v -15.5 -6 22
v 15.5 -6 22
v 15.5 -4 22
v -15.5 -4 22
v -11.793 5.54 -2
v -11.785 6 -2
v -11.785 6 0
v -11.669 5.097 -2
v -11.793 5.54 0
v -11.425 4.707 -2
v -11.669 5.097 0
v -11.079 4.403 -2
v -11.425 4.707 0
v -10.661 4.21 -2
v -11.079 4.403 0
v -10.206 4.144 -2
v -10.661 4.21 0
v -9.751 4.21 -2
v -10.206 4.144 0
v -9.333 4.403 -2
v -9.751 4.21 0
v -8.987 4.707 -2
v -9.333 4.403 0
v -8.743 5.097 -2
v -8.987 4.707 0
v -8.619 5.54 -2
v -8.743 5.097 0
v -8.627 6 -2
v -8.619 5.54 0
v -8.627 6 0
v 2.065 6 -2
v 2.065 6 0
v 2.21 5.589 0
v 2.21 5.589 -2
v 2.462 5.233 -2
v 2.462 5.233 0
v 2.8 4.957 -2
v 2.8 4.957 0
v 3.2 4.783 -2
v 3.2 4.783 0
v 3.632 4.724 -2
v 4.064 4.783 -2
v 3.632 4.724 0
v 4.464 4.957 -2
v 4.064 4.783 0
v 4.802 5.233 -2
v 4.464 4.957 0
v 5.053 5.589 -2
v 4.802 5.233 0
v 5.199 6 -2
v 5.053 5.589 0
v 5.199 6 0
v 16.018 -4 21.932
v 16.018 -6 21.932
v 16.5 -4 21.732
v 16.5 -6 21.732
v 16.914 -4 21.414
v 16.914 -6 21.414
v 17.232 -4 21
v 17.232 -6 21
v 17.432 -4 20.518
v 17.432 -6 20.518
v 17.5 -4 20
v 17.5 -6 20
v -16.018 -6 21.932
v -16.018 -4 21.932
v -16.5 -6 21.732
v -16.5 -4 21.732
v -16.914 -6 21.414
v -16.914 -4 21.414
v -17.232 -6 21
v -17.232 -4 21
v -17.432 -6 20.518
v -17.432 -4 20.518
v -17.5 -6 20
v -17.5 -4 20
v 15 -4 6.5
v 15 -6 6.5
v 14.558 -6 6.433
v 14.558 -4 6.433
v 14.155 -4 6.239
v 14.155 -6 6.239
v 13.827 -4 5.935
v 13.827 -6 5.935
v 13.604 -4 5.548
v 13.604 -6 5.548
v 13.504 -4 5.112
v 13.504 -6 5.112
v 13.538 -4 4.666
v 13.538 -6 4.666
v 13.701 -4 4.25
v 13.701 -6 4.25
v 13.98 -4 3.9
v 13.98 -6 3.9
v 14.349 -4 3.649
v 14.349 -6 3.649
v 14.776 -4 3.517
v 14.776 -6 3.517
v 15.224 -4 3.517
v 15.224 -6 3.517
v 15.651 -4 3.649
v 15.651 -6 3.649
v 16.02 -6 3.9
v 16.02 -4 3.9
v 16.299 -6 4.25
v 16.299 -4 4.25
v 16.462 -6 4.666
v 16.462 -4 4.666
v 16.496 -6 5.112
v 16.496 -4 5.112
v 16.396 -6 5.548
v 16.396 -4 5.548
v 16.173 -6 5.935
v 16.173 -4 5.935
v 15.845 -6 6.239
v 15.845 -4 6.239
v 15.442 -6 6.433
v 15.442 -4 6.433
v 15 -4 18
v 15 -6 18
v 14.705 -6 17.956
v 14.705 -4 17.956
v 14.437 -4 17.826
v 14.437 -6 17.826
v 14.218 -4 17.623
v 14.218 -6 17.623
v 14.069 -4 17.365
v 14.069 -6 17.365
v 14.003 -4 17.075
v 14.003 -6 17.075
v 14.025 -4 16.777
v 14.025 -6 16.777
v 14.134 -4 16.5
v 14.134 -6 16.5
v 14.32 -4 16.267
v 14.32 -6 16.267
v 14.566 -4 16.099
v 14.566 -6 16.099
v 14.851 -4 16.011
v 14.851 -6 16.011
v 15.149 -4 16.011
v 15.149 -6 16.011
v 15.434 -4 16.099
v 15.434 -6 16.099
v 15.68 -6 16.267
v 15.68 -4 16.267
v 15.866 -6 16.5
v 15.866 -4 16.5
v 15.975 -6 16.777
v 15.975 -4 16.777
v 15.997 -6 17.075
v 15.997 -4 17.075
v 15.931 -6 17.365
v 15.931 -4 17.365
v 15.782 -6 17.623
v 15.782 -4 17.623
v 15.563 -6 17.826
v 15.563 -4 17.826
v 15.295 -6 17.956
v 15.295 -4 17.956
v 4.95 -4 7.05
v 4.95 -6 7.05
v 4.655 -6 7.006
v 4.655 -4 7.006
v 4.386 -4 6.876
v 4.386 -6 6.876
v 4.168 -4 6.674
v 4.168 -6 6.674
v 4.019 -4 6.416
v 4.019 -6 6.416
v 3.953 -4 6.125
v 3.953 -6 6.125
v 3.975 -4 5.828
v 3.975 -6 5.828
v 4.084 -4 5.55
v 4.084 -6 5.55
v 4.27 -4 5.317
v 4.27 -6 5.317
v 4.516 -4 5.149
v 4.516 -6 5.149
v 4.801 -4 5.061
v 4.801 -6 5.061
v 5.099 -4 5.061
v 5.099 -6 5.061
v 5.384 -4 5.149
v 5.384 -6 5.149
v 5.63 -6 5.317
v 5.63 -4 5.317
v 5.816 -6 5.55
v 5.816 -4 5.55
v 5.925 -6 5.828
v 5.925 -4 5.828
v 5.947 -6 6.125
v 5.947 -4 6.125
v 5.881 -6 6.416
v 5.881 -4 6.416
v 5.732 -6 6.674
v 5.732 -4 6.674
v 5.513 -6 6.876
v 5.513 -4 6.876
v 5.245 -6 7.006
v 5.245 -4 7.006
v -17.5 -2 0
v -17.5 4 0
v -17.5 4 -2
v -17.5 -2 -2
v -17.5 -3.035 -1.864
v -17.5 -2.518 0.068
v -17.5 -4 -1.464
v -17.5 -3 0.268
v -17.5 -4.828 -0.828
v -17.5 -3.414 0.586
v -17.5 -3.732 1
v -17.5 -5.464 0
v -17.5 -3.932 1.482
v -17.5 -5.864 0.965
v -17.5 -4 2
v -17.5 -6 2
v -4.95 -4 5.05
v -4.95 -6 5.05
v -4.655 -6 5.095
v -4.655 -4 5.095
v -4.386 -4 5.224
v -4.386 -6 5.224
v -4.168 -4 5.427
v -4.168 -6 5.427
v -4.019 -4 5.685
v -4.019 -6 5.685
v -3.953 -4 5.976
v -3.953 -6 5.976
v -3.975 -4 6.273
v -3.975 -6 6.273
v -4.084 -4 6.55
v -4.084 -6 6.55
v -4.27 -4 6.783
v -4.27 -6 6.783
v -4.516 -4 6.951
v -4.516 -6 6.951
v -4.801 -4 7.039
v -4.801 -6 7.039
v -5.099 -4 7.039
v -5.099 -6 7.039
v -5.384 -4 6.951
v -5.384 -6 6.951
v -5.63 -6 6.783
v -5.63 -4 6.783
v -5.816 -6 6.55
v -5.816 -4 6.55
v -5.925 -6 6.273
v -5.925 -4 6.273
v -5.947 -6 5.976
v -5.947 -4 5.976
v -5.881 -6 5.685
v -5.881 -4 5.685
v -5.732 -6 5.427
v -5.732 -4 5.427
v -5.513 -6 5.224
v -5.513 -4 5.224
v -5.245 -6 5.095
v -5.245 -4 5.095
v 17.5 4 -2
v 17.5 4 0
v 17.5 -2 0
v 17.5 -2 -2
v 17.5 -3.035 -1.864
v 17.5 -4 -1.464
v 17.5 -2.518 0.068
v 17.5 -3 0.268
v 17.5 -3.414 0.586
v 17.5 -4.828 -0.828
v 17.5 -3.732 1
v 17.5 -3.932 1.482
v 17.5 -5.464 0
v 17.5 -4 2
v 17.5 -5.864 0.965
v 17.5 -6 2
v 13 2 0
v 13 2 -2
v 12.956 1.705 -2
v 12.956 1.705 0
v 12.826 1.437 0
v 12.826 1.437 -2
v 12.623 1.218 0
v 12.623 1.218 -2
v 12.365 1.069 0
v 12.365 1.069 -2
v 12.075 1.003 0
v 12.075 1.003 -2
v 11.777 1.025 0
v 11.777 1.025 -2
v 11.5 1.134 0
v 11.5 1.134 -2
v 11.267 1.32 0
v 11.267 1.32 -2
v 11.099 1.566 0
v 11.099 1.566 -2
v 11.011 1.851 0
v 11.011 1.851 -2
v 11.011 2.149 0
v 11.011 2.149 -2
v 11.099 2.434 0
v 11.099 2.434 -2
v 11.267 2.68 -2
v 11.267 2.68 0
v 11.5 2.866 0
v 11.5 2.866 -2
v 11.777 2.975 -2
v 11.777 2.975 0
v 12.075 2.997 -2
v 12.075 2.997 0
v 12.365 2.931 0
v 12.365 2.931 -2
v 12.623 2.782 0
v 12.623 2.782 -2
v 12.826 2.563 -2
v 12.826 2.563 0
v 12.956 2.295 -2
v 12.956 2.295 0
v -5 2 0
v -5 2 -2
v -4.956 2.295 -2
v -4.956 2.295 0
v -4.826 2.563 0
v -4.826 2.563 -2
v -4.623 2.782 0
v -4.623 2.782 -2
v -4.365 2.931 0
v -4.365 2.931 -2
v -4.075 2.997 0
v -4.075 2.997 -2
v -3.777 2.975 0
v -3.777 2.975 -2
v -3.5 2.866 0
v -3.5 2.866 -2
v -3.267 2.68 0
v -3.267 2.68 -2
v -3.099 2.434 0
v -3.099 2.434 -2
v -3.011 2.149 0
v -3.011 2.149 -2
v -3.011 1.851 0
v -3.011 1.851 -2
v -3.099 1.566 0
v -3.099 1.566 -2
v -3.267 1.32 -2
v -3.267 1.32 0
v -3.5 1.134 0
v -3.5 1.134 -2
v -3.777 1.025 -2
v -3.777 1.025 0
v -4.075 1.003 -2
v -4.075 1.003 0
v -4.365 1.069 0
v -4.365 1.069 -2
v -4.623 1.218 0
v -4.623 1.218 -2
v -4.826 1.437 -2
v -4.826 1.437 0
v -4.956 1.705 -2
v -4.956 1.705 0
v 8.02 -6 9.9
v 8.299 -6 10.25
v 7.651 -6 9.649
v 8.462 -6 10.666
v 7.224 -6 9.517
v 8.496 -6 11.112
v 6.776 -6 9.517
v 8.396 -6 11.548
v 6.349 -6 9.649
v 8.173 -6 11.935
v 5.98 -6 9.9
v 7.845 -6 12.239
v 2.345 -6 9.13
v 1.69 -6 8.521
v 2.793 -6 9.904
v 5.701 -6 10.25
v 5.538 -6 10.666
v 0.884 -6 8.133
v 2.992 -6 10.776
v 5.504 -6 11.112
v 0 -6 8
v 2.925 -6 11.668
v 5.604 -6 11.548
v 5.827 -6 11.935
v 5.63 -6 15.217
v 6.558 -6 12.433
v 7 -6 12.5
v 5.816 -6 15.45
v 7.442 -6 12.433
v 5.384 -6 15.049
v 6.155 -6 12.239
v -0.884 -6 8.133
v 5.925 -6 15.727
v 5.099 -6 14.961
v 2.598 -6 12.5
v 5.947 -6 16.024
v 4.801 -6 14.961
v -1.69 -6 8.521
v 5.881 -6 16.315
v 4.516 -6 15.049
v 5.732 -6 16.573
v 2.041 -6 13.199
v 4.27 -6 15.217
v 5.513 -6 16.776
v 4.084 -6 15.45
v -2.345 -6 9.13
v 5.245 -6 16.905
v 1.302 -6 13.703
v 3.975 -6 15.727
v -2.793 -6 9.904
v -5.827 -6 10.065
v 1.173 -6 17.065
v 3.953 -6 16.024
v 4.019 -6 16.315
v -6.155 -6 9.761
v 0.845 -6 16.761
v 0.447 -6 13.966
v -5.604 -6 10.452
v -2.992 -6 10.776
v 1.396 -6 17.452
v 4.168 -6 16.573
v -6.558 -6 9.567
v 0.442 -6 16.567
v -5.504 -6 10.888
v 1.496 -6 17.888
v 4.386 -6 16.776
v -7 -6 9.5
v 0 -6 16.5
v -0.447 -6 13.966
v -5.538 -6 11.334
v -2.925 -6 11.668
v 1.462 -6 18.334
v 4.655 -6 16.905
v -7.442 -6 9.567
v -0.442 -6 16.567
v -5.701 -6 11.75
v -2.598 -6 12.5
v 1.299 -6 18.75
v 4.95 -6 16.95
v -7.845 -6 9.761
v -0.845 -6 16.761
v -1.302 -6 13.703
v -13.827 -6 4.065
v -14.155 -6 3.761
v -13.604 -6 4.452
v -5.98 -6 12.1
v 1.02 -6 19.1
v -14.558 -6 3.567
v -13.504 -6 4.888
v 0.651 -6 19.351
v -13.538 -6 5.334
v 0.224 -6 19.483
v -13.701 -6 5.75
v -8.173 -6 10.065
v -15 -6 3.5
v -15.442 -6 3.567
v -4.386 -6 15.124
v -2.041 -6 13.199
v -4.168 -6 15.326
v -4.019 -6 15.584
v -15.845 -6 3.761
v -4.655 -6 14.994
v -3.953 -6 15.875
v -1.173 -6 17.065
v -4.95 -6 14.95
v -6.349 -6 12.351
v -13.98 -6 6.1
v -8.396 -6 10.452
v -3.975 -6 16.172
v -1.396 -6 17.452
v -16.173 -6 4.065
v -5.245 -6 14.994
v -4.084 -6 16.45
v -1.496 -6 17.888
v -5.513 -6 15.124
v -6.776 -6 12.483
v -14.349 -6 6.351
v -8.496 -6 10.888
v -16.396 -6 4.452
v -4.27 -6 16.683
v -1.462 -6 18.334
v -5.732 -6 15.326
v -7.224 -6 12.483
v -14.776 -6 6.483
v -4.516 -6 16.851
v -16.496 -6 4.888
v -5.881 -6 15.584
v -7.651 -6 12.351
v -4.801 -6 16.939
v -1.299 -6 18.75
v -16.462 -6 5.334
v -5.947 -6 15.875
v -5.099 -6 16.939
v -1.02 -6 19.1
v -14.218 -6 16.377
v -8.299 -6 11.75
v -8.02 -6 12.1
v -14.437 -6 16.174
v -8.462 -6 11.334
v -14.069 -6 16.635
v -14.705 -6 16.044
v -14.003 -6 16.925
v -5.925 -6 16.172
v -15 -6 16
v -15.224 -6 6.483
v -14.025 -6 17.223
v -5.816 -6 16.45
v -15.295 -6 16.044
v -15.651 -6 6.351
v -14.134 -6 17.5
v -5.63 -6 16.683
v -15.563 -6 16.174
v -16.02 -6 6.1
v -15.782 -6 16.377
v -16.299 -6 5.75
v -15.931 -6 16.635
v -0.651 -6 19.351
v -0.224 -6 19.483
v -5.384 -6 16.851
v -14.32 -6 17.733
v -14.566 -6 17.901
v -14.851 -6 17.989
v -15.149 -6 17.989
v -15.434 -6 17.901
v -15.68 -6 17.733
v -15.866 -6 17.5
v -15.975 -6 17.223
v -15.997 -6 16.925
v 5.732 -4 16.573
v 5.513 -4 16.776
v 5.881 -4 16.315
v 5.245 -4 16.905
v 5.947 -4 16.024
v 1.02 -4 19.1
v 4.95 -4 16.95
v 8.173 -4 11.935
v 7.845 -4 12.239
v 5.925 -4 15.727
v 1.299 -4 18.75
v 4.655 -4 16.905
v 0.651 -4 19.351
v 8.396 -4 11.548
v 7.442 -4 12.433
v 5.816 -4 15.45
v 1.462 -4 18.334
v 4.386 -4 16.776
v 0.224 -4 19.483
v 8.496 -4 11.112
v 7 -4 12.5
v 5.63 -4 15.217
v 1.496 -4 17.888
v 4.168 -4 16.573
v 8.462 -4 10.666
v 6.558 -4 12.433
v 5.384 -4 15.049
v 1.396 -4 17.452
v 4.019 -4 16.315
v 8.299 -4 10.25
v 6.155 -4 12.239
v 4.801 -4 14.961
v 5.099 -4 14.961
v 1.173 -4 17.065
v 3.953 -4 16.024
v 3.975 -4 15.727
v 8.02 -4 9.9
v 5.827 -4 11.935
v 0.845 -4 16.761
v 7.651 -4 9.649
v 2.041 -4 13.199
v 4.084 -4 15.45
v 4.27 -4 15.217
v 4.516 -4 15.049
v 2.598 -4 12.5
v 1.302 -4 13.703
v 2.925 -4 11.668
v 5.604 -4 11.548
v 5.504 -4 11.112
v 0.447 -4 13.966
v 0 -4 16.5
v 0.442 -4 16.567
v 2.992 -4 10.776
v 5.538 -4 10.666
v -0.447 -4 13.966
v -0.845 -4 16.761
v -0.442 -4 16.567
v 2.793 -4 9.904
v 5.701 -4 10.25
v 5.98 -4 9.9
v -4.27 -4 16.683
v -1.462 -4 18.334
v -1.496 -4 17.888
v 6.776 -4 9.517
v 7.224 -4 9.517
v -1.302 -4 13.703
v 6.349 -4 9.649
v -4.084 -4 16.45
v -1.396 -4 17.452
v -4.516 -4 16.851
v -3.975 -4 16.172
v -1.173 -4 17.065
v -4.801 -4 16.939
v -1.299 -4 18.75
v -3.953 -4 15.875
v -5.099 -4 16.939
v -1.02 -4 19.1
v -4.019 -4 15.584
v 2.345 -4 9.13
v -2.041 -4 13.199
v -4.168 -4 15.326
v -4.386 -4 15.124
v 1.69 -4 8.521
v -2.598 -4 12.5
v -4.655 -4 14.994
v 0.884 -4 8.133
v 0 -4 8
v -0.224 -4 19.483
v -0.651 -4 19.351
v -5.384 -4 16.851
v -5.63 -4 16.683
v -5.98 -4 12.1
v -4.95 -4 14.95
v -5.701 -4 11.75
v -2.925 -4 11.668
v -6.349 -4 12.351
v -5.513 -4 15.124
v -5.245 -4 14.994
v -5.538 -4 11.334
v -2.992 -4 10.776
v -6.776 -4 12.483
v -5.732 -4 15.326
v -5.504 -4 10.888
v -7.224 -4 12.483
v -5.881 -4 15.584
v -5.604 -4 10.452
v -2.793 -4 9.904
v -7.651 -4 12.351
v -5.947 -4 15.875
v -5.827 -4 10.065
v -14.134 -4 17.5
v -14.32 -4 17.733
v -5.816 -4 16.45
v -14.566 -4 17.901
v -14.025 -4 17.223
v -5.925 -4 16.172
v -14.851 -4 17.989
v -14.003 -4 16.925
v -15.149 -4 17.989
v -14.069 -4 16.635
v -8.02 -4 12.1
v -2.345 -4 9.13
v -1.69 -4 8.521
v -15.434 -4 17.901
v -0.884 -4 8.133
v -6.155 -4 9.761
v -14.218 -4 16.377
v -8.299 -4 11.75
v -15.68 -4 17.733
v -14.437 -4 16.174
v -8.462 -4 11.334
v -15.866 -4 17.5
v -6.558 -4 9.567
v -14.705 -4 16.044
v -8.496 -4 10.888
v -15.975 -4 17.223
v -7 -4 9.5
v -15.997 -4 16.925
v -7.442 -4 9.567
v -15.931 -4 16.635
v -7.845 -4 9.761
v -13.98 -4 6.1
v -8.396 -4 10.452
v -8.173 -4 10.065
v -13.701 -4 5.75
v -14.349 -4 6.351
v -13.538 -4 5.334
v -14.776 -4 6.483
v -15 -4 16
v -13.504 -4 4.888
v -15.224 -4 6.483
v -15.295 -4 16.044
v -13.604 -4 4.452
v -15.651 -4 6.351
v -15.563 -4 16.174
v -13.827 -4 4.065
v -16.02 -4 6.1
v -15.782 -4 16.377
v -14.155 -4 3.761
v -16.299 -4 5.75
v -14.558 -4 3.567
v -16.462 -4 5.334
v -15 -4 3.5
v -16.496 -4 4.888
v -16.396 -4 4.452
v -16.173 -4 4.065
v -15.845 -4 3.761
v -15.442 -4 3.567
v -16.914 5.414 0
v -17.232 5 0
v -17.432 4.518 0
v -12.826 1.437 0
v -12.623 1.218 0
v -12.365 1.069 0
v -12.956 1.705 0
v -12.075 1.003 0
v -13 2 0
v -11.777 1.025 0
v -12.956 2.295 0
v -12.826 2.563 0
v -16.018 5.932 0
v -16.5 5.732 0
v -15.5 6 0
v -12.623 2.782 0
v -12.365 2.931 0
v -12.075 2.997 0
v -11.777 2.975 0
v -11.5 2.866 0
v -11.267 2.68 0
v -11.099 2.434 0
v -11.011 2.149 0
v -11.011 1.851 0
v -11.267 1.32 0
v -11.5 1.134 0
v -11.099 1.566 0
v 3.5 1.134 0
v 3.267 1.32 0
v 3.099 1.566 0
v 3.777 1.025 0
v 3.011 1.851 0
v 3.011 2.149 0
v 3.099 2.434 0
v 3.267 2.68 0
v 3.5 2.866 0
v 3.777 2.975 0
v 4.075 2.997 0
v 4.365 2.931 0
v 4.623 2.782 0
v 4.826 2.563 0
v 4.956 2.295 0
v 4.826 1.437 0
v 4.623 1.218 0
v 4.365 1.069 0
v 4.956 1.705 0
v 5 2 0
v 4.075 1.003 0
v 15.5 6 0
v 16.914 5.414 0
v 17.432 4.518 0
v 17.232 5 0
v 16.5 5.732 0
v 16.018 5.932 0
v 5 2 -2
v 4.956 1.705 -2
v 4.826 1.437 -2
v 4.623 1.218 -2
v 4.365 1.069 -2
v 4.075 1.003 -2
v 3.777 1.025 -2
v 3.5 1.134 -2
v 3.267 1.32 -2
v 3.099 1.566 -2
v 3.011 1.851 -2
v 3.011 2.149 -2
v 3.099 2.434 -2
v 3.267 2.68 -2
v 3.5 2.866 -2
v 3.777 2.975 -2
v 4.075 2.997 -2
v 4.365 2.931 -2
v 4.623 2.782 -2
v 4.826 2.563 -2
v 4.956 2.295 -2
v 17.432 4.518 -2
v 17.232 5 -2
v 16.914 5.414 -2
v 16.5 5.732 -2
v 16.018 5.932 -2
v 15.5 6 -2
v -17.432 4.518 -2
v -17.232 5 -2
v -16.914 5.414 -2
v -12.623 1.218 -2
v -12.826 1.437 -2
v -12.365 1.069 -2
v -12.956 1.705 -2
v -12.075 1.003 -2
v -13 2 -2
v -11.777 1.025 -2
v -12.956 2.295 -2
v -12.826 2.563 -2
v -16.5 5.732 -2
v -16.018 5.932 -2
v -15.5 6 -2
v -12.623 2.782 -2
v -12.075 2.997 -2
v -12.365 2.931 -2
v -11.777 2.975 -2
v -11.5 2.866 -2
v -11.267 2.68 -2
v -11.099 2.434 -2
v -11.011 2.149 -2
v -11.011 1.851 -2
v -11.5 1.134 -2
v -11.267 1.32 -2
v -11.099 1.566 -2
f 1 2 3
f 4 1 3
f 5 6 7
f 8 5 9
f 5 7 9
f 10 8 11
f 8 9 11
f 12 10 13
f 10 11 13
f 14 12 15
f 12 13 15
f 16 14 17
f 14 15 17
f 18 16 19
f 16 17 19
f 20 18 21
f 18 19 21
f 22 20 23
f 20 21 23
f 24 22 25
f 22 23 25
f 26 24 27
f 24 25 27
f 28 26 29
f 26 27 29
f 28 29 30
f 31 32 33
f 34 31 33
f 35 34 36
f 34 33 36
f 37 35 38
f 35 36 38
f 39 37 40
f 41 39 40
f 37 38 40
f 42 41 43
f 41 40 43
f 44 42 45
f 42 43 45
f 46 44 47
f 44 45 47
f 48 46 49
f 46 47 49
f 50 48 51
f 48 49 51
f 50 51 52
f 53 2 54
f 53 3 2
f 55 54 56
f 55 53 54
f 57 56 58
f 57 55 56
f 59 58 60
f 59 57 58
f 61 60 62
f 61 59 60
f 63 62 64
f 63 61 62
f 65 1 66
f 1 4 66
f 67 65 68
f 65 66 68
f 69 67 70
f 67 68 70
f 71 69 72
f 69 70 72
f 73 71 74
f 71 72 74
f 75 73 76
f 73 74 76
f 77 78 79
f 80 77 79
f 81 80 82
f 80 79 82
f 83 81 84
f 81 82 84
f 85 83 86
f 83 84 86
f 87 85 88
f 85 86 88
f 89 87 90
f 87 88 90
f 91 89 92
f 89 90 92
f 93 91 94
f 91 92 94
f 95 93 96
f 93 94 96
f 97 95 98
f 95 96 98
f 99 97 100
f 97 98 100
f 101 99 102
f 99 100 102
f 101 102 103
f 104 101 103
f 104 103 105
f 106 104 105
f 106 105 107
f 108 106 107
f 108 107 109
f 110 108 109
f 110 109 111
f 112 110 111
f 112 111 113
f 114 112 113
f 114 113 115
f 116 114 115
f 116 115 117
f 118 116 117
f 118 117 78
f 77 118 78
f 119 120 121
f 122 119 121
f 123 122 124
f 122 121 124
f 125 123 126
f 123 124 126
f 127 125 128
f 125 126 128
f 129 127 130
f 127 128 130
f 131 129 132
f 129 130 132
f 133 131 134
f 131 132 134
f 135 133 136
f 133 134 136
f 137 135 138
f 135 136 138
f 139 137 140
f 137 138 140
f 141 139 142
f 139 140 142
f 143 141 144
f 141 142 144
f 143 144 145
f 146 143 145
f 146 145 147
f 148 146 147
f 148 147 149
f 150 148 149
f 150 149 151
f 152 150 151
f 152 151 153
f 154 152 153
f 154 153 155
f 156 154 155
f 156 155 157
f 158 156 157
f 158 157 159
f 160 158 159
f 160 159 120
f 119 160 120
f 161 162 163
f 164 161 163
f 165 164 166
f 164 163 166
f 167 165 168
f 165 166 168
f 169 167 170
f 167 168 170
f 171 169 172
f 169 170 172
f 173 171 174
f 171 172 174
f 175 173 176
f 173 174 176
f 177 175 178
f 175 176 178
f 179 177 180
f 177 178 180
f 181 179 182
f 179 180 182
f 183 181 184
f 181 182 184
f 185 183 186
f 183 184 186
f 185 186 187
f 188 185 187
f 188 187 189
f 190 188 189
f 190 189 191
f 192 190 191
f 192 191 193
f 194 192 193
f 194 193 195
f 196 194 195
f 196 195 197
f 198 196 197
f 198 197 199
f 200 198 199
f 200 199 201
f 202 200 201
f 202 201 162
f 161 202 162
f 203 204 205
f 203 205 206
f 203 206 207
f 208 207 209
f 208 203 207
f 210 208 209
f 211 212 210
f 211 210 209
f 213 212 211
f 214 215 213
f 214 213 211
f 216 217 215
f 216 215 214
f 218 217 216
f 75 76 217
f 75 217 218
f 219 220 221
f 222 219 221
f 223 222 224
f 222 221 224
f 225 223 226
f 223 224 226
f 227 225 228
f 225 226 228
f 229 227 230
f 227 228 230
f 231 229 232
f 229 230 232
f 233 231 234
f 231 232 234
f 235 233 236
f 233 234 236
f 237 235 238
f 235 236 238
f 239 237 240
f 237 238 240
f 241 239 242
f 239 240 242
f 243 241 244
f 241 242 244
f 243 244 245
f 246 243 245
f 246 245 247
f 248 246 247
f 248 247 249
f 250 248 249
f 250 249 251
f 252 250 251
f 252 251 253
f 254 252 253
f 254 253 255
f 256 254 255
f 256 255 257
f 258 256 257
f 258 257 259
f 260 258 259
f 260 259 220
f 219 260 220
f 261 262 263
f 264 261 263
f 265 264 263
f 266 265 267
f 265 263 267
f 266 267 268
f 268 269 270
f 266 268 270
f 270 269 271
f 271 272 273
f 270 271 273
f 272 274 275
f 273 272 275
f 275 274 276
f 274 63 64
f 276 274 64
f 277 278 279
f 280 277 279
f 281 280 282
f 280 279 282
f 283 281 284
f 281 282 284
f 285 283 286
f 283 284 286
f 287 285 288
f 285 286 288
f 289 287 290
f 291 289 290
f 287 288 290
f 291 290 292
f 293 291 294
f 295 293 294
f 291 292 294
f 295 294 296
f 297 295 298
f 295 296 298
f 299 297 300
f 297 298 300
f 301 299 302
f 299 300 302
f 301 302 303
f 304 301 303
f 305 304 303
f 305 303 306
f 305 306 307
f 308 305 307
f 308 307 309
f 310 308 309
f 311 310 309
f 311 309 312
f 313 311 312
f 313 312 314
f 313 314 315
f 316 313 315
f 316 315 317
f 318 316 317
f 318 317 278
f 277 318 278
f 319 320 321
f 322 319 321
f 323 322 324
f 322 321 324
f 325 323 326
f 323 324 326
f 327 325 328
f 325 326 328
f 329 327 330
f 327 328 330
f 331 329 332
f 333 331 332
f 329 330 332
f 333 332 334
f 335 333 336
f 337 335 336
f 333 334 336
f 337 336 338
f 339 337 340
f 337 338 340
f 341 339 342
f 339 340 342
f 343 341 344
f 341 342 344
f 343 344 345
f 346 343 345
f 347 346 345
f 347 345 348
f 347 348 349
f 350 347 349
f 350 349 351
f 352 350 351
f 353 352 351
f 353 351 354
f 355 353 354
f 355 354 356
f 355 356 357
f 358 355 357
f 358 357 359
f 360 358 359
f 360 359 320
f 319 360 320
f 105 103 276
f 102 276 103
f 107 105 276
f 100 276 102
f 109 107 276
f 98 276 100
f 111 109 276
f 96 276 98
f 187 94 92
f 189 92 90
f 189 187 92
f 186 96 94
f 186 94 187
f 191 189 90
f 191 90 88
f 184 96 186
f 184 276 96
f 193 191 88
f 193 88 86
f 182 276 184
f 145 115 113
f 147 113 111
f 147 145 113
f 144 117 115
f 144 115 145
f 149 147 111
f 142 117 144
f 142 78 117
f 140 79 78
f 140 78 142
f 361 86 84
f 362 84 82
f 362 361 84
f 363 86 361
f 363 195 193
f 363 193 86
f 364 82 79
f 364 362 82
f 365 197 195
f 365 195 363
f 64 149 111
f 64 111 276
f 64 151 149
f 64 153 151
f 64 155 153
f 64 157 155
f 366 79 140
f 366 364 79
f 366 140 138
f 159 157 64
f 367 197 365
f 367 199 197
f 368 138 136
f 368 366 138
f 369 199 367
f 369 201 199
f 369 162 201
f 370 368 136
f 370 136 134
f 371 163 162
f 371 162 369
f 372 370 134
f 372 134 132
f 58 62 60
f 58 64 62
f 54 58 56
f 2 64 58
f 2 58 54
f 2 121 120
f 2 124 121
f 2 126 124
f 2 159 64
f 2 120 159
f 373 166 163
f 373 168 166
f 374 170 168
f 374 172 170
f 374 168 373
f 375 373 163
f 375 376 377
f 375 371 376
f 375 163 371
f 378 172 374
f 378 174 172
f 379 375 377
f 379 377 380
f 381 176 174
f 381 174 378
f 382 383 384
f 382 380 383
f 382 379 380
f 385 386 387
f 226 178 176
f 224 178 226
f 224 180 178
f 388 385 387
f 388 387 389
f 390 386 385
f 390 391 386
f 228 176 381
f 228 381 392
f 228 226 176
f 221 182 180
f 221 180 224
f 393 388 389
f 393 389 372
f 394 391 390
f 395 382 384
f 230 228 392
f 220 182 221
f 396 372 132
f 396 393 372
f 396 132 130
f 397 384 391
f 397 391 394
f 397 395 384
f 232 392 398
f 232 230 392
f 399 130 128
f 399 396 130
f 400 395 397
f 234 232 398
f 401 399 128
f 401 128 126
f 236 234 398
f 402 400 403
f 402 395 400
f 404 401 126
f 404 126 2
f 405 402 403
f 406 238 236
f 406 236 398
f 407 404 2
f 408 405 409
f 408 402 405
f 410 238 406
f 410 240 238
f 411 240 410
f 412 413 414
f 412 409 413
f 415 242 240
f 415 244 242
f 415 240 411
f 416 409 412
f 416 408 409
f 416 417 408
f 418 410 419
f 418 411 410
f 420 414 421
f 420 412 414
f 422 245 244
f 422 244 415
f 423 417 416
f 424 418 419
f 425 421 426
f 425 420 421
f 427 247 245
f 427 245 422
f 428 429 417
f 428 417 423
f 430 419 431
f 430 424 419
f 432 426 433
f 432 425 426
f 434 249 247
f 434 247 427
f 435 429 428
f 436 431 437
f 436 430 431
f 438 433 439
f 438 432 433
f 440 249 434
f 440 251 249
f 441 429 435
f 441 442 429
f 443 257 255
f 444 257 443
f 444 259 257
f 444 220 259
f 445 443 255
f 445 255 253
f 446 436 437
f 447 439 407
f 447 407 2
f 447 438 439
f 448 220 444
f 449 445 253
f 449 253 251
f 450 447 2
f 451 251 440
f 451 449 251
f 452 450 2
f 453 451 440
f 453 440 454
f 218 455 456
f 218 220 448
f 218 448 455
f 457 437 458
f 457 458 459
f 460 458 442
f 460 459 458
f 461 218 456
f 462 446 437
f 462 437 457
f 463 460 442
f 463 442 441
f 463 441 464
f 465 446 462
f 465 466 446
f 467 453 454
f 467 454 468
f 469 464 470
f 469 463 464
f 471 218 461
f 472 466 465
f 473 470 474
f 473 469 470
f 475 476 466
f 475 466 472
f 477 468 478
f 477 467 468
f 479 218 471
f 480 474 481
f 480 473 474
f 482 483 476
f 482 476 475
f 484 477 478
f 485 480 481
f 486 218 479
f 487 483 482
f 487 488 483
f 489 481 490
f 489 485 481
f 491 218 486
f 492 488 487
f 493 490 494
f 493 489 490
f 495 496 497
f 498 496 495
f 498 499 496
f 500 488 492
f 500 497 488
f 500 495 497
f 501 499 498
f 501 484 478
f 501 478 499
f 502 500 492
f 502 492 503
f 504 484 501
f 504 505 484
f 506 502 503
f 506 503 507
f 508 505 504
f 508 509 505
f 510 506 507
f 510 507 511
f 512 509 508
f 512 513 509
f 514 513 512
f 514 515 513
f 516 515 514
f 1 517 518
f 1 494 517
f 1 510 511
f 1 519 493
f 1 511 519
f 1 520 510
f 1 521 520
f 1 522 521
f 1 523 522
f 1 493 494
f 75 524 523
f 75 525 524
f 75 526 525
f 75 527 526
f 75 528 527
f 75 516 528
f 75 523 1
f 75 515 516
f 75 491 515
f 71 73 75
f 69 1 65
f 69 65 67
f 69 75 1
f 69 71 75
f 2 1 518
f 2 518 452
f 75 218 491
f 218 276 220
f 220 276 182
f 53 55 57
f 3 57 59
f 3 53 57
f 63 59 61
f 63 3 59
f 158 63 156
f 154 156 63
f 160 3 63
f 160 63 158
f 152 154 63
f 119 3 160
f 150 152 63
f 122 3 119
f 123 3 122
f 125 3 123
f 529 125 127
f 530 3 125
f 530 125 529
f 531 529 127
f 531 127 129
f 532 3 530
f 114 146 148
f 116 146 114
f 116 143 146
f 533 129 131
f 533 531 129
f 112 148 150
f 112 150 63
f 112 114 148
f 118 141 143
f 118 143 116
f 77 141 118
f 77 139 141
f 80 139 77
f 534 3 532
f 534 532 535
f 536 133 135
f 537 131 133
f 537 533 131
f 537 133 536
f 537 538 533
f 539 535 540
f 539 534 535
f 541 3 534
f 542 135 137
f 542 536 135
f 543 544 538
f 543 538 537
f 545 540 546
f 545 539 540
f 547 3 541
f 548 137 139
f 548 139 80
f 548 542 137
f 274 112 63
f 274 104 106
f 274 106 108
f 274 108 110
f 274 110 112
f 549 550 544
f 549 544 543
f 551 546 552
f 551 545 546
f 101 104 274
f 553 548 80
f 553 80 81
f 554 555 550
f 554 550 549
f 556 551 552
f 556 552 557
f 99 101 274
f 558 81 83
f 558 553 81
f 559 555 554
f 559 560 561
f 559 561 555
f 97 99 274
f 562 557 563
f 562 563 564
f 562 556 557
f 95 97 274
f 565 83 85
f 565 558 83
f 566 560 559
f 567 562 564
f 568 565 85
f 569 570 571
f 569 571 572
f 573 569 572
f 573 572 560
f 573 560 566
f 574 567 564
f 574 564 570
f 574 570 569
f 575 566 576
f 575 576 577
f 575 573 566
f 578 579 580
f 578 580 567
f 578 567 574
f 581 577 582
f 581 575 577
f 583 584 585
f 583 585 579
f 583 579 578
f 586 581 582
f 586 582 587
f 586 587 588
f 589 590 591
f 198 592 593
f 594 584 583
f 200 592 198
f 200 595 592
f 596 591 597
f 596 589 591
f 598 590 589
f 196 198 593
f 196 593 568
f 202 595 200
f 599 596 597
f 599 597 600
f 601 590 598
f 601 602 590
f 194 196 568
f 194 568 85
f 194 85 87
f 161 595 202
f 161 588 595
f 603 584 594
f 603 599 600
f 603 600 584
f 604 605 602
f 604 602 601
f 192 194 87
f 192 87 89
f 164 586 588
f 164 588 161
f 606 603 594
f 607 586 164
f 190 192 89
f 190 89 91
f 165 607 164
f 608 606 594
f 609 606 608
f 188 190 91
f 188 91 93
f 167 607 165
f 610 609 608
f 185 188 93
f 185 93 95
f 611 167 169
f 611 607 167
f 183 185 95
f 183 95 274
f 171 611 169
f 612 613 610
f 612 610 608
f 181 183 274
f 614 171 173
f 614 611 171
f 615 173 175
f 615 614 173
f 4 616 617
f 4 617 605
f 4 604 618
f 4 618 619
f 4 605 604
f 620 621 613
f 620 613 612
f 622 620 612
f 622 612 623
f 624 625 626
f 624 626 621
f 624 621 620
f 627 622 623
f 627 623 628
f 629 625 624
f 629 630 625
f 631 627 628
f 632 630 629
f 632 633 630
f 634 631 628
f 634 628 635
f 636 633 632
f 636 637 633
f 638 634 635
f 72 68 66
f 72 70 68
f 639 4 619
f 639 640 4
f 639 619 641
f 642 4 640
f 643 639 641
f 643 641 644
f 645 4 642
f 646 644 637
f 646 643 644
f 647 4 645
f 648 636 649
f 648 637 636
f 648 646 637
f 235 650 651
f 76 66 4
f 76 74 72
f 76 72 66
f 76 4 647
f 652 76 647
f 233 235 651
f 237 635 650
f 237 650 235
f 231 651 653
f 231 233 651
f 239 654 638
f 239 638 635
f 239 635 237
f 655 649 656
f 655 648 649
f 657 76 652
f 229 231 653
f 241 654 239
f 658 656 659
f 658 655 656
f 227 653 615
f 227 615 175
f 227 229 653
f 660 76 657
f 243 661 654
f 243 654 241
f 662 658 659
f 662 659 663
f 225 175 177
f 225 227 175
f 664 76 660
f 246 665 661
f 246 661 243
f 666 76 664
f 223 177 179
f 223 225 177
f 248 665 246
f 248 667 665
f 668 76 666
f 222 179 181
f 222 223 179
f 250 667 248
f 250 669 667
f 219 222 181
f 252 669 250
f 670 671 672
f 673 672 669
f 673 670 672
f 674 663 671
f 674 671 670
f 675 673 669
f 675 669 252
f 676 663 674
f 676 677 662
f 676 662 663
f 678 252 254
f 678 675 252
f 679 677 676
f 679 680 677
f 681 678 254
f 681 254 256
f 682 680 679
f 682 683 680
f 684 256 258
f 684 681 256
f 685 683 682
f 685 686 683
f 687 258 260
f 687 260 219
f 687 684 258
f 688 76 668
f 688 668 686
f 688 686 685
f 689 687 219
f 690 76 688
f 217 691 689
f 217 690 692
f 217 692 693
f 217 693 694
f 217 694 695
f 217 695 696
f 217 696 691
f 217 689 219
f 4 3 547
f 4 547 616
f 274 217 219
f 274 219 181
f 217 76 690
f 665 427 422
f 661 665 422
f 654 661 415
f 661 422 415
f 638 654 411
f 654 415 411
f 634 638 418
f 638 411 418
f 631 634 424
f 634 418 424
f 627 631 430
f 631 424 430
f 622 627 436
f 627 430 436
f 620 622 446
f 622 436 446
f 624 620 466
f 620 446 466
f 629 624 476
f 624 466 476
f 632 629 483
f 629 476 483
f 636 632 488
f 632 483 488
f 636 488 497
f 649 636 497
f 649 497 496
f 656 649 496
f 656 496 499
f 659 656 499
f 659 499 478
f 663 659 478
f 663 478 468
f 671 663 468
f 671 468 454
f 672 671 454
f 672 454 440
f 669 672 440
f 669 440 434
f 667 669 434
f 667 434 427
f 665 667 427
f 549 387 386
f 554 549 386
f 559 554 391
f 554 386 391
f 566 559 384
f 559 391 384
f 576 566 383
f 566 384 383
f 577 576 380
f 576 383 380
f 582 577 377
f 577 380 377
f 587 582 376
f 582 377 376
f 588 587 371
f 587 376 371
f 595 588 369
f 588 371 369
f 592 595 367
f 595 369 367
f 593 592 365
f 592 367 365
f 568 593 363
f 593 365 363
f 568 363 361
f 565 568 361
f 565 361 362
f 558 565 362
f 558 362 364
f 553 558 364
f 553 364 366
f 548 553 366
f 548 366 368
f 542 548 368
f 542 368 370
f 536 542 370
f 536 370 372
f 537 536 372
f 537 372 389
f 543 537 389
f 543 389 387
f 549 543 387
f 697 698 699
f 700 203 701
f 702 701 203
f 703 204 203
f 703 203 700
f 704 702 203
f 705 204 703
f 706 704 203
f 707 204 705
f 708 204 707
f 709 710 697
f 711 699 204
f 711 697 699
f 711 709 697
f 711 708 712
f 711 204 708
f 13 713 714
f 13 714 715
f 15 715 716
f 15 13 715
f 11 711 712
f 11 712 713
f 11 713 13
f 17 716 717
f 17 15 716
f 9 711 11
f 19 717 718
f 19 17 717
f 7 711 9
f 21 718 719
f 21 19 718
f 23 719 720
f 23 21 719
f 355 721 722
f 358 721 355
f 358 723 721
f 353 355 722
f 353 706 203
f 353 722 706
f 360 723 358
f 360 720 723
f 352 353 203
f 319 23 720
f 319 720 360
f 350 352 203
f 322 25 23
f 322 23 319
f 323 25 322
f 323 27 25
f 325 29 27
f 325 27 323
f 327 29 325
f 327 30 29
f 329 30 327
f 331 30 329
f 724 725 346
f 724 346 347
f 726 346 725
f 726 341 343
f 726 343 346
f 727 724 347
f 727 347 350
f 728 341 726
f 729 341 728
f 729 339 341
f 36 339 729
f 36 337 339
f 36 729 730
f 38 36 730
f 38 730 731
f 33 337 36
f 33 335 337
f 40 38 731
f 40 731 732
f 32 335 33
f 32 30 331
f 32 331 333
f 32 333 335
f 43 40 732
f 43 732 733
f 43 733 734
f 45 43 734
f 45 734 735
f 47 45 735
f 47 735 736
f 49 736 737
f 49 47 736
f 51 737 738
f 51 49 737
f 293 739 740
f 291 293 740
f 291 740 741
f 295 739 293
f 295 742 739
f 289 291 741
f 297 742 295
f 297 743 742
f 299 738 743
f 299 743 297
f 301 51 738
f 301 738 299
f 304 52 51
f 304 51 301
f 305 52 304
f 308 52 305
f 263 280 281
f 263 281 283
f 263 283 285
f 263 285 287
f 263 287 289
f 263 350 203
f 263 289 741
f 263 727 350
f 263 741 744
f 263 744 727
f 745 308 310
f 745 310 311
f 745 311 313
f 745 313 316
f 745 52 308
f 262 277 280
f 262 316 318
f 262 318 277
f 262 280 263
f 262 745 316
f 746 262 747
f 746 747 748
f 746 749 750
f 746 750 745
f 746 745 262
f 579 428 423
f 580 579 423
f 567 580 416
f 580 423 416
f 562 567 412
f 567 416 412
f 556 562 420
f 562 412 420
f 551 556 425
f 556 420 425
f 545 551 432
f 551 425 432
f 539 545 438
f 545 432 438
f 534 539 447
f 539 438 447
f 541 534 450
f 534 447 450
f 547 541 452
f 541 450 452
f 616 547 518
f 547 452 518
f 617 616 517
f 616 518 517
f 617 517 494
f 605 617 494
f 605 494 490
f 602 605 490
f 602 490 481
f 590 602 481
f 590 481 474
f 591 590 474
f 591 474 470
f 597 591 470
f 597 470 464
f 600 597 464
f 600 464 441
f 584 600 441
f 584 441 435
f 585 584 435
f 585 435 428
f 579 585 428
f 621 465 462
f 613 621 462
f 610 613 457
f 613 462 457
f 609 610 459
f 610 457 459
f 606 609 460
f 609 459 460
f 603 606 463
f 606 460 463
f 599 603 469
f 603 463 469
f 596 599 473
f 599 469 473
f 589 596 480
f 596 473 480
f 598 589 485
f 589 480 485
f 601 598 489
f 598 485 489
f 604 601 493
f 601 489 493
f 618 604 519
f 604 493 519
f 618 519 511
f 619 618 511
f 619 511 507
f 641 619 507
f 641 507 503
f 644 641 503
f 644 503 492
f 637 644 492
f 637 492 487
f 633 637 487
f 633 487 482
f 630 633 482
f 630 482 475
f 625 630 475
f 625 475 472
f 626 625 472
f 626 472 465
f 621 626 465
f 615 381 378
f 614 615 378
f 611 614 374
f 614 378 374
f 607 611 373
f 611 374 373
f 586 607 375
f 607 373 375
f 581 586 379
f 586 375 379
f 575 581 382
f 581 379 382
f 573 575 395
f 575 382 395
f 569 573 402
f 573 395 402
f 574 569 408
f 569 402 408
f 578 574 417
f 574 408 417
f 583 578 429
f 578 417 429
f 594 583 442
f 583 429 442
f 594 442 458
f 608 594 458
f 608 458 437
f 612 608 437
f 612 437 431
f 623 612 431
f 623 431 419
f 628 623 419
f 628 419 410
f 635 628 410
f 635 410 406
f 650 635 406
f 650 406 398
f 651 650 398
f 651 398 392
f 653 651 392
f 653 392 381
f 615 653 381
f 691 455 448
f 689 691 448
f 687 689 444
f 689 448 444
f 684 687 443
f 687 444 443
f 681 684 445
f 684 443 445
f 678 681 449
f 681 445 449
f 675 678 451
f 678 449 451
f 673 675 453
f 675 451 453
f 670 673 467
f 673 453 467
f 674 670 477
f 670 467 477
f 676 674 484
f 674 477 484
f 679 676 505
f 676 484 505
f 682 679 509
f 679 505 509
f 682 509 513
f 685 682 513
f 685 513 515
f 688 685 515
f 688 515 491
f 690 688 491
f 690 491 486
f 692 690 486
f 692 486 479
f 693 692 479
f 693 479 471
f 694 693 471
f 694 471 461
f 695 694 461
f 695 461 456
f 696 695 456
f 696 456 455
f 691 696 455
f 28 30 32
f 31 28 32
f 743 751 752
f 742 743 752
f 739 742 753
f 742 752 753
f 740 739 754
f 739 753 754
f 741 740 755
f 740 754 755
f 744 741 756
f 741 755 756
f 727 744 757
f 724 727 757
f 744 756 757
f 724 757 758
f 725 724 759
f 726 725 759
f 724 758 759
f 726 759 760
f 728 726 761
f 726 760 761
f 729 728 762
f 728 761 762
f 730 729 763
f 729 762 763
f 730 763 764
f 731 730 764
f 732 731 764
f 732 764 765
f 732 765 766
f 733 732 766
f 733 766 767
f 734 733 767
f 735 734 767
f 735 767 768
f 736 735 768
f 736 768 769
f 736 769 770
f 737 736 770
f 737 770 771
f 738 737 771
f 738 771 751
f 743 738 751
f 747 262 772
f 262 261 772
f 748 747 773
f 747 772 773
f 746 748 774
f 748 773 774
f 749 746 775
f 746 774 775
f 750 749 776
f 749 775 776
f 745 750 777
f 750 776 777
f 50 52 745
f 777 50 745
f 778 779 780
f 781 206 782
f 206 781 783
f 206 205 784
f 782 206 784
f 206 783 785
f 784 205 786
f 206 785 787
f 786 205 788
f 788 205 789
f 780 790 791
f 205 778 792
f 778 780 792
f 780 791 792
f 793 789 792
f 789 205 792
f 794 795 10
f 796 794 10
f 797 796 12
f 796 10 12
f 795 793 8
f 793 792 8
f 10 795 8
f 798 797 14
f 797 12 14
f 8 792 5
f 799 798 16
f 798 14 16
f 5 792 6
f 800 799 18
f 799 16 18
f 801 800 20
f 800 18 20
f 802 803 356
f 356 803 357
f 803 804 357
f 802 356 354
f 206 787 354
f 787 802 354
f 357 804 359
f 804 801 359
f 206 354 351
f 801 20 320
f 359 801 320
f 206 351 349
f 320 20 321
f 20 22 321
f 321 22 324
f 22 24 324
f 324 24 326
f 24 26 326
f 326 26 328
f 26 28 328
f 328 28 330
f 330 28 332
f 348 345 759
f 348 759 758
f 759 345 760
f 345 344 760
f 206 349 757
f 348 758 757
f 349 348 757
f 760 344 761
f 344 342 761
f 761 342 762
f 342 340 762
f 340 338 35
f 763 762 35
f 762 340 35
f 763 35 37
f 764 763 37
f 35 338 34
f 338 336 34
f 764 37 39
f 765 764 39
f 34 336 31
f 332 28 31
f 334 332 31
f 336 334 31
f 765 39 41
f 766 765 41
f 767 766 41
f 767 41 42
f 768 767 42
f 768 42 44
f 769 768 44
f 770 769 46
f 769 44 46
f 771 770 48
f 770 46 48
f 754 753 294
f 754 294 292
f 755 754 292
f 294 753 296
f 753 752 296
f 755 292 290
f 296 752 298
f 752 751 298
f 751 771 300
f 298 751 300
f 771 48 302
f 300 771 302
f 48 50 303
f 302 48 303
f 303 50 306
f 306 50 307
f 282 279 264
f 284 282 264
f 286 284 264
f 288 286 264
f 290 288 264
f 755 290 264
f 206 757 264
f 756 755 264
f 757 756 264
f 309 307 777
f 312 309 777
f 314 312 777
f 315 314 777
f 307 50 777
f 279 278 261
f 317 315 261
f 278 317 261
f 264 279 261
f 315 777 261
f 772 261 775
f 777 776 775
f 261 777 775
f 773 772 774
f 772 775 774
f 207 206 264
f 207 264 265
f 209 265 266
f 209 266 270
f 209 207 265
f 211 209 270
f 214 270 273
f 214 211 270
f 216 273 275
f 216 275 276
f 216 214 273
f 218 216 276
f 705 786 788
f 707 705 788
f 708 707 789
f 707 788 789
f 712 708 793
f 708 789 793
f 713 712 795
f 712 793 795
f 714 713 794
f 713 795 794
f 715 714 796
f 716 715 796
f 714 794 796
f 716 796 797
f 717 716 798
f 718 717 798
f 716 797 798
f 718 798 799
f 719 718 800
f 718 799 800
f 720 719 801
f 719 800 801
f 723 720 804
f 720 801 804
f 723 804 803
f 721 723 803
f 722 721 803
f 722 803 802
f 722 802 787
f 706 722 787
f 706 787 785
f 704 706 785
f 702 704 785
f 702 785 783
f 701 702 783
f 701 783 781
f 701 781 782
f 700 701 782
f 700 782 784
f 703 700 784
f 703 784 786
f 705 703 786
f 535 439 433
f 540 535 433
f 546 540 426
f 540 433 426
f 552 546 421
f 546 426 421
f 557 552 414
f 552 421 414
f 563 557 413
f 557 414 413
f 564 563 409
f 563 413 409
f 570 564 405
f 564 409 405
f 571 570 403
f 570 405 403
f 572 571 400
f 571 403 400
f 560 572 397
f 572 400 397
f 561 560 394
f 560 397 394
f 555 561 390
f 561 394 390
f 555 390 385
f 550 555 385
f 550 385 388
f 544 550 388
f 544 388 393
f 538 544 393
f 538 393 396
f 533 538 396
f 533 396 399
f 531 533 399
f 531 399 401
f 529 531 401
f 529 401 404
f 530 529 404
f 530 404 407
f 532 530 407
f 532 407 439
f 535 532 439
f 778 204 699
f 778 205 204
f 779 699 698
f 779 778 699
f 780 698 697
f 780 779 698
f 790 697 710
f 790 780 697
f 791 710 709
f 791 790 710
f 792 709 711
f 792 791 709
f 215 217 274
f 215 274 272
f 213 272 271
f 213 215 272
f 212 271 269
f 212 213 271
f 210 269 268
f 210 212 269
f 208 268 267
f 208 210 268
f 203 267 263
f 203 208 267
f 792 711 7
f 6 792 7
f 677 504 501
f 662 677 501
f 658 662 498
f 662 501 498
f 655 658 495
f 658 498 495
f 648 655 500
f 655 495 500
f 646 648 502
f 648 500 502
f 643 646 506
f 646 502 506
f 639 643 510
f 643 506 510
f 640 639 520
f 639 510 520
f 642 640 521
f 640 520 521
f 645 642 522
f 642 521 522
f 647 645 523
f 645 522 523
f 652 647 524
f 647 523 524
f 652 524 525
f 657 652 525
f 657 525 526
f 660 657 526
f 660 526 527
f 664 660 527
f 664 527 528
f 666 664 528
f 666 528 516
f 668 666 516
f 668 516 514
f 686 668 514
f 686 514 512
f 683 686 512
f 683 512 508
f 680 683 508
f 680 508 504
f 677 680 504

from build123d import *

# Parameters (mm, degrees)
SKETCH1_W                    = 35
SKETCH1_H                    = 12
BASE_FLANGE1_DEPTH           = 2
EDGE_FLANGE1_STRIP_W         = 12
EDGE_FLANGE1_STRIP_H         = 2
EDGE_FLANGE1_STRIP_CUT_DEPTH = 35
EDGE_FLANGE1_DEPTH           = 35
FILLET1_R                    = 2
SKETCH9_R                    = 1
CUT_EXTRUDE1_DEPTH           = 10
SKETCH10_R                   = 3
SKETCH10_R_2                 = 1.5
SKETCH10_R_3                 = 1
CUT_EXTRUDE2_DEPTH           = 10
SKETCH11_R                   = 1.6
CUT_EXTRUDE3_DEPTH           = 10


# Sheet-metal steps are written as plain solids
with BuildPart() as part:
    # Sketch1 → Base-Flange1 (new body)
    with BuildSketch(Plane.XY):
        Rectangle(SKETCH1_W, SKETCH1_H)
    extrude(amount=-BASE_FLANGE1_DEPTH)

    # Edge-Flange1 strip (across the edge) → Edge-Flange1 strip cut (cut)
    with BuildSketch(Plane(origin=(-17.5, -6, 0), x_dir=(0, 1, 0), z_dir=(1, 0, 0))):
        with Locations((-2, -1)):
            Rectangle(EDGE_FLANGE1_STRIP_W, EDGE_FLANGE1_STRIP_H)
    extrude(amount=EDGE_FLANGE1_STRIP_CUT_DEPTH, mode=Mode.SUBTRACT)

    # Edge-Flange1 section (across the edge) → Edge-Flange1 (add)
    with BuildSketch(Plane(origin=(-17.5, -6, 0), x_dir=(0, 1, 0), z_dir=(1, 0, 0))):
        with BuildLine():
            Line((0, 2), (0, 22))
            Line((0, 22), (2, 22))
            Line((2, 22), (2, 2))
            ThreePointArc((2, 2), (2.585786438, 0.585786438), (4, 0))
            Line((4, 0), (4, -2))
            ThreePointArc((4, -2), (1.171572875, -0.828427125), (0, 2))
        make_face()
    extrude(amount=EDGE_FLANGE1_DEPTH)

    # Fillet1
    fillet1_edges = [part.edges().sort_by_distance(p)[0] for p in [
        (-17.5, -5, 22),
        (17.5, -5, 22),
        (-17.5, 6, -1),
        (17.5, 6, -1),
    ]]
    fillet(fillet1_edges, radius=FILLET1_R)

    # Sketch9 → Cut-Extrude1 (cut)
    with BuildSketch(Plane(origin=(0, 0, -2), x_dir=(-1, 0, 0), z_dir=(0, 0, -1))):
        with Locations((4, 2)):
            Circle(SKETCH9_R)
        with Locations((12, 2)):
            Circle(SKETCH9_R)
        with Locations(Location((-12, 2, 0), (0, 0, 180))):
            Circle(SKETCH9_R)
        with Locations(Location((-4, 2, 0), (0, 0, 180))):
            Circle(SKETCH9_R)
    extrude(amount=-CUT_EXTRUDE1_DEPTH, mode=Mode.SUBTRACT)

    # Sketch10 → Cut-Extrude2 (cut)
    with BuildSketch(Plane.XZ.offset(6)):
        with Locations(Location((0, 11, 0), (0, 0, 270))):
            Circle(SKETCH10_R)
        with Locations(Location((-7, 11, 0), (0, 0, 270))):
            Circle(SKETCH10_R_2)
        with Locations(Location((-15, 5, 0), (0, 0, 270))):
            Circle(SKETCH10_R_2)
        with Locations(Location((-15, 17, 0), (0, 0, 270))):
            Circle(SKETCH10_R_3)
        with Locations(Location((-4.949747468, 15.949747468, 0), (0, 0, 270))):
            Circle(SKETCH10_R_3)
        with Locations(Location((-4.949747468, 6.050252532, 0), (0, 0, 270))):
            Circle(SKETCH10_R_3)
        with Locations(Location((0, 18, 0), (0, 0, 270))):
            Circle(SKETCH10_R_2)
        with Locations(Location((15, 17, 0), (0, 0, 90))):
            Circle(SKETCH10_R_3)
        with Locations(Location((15, 5, 0), (0, 0, 90))):
            Circle(SKETCH10_R_2)
        with Locations(Location((4.949747468, 6.050252532, 0), (0, 0, 90))):
            Circle(SKETCH10_R_3)
        with Locations(Location((7, 11, 0), (0, 0, 90))):
            Circle(SKETCH10_R_2)
        with Locations(Location((4.949747468, 15.949747468, 0), (0, 0, 90))):
            Circle(SKETCH10_R_3)
    extrude(amount=-CUT_EXTRUDE2_DEPTH, mode=Mode.SUBTRACT)

    # Sketch11 → Cut-Extrude3 (cut)
    with BuildSketch(Plane.XY):
        with Locations((-10.205953252, 5.743869118)):
            Circle(SKETCH11_R)
        with Locations((3.631753083, 6.323821502)):
            Circle(SKETCH11_R)
    extrude(amount=-CUT_EXTRUDE3_DEPTH, mode=Mode.SUBTRACT)


solid = part.part
